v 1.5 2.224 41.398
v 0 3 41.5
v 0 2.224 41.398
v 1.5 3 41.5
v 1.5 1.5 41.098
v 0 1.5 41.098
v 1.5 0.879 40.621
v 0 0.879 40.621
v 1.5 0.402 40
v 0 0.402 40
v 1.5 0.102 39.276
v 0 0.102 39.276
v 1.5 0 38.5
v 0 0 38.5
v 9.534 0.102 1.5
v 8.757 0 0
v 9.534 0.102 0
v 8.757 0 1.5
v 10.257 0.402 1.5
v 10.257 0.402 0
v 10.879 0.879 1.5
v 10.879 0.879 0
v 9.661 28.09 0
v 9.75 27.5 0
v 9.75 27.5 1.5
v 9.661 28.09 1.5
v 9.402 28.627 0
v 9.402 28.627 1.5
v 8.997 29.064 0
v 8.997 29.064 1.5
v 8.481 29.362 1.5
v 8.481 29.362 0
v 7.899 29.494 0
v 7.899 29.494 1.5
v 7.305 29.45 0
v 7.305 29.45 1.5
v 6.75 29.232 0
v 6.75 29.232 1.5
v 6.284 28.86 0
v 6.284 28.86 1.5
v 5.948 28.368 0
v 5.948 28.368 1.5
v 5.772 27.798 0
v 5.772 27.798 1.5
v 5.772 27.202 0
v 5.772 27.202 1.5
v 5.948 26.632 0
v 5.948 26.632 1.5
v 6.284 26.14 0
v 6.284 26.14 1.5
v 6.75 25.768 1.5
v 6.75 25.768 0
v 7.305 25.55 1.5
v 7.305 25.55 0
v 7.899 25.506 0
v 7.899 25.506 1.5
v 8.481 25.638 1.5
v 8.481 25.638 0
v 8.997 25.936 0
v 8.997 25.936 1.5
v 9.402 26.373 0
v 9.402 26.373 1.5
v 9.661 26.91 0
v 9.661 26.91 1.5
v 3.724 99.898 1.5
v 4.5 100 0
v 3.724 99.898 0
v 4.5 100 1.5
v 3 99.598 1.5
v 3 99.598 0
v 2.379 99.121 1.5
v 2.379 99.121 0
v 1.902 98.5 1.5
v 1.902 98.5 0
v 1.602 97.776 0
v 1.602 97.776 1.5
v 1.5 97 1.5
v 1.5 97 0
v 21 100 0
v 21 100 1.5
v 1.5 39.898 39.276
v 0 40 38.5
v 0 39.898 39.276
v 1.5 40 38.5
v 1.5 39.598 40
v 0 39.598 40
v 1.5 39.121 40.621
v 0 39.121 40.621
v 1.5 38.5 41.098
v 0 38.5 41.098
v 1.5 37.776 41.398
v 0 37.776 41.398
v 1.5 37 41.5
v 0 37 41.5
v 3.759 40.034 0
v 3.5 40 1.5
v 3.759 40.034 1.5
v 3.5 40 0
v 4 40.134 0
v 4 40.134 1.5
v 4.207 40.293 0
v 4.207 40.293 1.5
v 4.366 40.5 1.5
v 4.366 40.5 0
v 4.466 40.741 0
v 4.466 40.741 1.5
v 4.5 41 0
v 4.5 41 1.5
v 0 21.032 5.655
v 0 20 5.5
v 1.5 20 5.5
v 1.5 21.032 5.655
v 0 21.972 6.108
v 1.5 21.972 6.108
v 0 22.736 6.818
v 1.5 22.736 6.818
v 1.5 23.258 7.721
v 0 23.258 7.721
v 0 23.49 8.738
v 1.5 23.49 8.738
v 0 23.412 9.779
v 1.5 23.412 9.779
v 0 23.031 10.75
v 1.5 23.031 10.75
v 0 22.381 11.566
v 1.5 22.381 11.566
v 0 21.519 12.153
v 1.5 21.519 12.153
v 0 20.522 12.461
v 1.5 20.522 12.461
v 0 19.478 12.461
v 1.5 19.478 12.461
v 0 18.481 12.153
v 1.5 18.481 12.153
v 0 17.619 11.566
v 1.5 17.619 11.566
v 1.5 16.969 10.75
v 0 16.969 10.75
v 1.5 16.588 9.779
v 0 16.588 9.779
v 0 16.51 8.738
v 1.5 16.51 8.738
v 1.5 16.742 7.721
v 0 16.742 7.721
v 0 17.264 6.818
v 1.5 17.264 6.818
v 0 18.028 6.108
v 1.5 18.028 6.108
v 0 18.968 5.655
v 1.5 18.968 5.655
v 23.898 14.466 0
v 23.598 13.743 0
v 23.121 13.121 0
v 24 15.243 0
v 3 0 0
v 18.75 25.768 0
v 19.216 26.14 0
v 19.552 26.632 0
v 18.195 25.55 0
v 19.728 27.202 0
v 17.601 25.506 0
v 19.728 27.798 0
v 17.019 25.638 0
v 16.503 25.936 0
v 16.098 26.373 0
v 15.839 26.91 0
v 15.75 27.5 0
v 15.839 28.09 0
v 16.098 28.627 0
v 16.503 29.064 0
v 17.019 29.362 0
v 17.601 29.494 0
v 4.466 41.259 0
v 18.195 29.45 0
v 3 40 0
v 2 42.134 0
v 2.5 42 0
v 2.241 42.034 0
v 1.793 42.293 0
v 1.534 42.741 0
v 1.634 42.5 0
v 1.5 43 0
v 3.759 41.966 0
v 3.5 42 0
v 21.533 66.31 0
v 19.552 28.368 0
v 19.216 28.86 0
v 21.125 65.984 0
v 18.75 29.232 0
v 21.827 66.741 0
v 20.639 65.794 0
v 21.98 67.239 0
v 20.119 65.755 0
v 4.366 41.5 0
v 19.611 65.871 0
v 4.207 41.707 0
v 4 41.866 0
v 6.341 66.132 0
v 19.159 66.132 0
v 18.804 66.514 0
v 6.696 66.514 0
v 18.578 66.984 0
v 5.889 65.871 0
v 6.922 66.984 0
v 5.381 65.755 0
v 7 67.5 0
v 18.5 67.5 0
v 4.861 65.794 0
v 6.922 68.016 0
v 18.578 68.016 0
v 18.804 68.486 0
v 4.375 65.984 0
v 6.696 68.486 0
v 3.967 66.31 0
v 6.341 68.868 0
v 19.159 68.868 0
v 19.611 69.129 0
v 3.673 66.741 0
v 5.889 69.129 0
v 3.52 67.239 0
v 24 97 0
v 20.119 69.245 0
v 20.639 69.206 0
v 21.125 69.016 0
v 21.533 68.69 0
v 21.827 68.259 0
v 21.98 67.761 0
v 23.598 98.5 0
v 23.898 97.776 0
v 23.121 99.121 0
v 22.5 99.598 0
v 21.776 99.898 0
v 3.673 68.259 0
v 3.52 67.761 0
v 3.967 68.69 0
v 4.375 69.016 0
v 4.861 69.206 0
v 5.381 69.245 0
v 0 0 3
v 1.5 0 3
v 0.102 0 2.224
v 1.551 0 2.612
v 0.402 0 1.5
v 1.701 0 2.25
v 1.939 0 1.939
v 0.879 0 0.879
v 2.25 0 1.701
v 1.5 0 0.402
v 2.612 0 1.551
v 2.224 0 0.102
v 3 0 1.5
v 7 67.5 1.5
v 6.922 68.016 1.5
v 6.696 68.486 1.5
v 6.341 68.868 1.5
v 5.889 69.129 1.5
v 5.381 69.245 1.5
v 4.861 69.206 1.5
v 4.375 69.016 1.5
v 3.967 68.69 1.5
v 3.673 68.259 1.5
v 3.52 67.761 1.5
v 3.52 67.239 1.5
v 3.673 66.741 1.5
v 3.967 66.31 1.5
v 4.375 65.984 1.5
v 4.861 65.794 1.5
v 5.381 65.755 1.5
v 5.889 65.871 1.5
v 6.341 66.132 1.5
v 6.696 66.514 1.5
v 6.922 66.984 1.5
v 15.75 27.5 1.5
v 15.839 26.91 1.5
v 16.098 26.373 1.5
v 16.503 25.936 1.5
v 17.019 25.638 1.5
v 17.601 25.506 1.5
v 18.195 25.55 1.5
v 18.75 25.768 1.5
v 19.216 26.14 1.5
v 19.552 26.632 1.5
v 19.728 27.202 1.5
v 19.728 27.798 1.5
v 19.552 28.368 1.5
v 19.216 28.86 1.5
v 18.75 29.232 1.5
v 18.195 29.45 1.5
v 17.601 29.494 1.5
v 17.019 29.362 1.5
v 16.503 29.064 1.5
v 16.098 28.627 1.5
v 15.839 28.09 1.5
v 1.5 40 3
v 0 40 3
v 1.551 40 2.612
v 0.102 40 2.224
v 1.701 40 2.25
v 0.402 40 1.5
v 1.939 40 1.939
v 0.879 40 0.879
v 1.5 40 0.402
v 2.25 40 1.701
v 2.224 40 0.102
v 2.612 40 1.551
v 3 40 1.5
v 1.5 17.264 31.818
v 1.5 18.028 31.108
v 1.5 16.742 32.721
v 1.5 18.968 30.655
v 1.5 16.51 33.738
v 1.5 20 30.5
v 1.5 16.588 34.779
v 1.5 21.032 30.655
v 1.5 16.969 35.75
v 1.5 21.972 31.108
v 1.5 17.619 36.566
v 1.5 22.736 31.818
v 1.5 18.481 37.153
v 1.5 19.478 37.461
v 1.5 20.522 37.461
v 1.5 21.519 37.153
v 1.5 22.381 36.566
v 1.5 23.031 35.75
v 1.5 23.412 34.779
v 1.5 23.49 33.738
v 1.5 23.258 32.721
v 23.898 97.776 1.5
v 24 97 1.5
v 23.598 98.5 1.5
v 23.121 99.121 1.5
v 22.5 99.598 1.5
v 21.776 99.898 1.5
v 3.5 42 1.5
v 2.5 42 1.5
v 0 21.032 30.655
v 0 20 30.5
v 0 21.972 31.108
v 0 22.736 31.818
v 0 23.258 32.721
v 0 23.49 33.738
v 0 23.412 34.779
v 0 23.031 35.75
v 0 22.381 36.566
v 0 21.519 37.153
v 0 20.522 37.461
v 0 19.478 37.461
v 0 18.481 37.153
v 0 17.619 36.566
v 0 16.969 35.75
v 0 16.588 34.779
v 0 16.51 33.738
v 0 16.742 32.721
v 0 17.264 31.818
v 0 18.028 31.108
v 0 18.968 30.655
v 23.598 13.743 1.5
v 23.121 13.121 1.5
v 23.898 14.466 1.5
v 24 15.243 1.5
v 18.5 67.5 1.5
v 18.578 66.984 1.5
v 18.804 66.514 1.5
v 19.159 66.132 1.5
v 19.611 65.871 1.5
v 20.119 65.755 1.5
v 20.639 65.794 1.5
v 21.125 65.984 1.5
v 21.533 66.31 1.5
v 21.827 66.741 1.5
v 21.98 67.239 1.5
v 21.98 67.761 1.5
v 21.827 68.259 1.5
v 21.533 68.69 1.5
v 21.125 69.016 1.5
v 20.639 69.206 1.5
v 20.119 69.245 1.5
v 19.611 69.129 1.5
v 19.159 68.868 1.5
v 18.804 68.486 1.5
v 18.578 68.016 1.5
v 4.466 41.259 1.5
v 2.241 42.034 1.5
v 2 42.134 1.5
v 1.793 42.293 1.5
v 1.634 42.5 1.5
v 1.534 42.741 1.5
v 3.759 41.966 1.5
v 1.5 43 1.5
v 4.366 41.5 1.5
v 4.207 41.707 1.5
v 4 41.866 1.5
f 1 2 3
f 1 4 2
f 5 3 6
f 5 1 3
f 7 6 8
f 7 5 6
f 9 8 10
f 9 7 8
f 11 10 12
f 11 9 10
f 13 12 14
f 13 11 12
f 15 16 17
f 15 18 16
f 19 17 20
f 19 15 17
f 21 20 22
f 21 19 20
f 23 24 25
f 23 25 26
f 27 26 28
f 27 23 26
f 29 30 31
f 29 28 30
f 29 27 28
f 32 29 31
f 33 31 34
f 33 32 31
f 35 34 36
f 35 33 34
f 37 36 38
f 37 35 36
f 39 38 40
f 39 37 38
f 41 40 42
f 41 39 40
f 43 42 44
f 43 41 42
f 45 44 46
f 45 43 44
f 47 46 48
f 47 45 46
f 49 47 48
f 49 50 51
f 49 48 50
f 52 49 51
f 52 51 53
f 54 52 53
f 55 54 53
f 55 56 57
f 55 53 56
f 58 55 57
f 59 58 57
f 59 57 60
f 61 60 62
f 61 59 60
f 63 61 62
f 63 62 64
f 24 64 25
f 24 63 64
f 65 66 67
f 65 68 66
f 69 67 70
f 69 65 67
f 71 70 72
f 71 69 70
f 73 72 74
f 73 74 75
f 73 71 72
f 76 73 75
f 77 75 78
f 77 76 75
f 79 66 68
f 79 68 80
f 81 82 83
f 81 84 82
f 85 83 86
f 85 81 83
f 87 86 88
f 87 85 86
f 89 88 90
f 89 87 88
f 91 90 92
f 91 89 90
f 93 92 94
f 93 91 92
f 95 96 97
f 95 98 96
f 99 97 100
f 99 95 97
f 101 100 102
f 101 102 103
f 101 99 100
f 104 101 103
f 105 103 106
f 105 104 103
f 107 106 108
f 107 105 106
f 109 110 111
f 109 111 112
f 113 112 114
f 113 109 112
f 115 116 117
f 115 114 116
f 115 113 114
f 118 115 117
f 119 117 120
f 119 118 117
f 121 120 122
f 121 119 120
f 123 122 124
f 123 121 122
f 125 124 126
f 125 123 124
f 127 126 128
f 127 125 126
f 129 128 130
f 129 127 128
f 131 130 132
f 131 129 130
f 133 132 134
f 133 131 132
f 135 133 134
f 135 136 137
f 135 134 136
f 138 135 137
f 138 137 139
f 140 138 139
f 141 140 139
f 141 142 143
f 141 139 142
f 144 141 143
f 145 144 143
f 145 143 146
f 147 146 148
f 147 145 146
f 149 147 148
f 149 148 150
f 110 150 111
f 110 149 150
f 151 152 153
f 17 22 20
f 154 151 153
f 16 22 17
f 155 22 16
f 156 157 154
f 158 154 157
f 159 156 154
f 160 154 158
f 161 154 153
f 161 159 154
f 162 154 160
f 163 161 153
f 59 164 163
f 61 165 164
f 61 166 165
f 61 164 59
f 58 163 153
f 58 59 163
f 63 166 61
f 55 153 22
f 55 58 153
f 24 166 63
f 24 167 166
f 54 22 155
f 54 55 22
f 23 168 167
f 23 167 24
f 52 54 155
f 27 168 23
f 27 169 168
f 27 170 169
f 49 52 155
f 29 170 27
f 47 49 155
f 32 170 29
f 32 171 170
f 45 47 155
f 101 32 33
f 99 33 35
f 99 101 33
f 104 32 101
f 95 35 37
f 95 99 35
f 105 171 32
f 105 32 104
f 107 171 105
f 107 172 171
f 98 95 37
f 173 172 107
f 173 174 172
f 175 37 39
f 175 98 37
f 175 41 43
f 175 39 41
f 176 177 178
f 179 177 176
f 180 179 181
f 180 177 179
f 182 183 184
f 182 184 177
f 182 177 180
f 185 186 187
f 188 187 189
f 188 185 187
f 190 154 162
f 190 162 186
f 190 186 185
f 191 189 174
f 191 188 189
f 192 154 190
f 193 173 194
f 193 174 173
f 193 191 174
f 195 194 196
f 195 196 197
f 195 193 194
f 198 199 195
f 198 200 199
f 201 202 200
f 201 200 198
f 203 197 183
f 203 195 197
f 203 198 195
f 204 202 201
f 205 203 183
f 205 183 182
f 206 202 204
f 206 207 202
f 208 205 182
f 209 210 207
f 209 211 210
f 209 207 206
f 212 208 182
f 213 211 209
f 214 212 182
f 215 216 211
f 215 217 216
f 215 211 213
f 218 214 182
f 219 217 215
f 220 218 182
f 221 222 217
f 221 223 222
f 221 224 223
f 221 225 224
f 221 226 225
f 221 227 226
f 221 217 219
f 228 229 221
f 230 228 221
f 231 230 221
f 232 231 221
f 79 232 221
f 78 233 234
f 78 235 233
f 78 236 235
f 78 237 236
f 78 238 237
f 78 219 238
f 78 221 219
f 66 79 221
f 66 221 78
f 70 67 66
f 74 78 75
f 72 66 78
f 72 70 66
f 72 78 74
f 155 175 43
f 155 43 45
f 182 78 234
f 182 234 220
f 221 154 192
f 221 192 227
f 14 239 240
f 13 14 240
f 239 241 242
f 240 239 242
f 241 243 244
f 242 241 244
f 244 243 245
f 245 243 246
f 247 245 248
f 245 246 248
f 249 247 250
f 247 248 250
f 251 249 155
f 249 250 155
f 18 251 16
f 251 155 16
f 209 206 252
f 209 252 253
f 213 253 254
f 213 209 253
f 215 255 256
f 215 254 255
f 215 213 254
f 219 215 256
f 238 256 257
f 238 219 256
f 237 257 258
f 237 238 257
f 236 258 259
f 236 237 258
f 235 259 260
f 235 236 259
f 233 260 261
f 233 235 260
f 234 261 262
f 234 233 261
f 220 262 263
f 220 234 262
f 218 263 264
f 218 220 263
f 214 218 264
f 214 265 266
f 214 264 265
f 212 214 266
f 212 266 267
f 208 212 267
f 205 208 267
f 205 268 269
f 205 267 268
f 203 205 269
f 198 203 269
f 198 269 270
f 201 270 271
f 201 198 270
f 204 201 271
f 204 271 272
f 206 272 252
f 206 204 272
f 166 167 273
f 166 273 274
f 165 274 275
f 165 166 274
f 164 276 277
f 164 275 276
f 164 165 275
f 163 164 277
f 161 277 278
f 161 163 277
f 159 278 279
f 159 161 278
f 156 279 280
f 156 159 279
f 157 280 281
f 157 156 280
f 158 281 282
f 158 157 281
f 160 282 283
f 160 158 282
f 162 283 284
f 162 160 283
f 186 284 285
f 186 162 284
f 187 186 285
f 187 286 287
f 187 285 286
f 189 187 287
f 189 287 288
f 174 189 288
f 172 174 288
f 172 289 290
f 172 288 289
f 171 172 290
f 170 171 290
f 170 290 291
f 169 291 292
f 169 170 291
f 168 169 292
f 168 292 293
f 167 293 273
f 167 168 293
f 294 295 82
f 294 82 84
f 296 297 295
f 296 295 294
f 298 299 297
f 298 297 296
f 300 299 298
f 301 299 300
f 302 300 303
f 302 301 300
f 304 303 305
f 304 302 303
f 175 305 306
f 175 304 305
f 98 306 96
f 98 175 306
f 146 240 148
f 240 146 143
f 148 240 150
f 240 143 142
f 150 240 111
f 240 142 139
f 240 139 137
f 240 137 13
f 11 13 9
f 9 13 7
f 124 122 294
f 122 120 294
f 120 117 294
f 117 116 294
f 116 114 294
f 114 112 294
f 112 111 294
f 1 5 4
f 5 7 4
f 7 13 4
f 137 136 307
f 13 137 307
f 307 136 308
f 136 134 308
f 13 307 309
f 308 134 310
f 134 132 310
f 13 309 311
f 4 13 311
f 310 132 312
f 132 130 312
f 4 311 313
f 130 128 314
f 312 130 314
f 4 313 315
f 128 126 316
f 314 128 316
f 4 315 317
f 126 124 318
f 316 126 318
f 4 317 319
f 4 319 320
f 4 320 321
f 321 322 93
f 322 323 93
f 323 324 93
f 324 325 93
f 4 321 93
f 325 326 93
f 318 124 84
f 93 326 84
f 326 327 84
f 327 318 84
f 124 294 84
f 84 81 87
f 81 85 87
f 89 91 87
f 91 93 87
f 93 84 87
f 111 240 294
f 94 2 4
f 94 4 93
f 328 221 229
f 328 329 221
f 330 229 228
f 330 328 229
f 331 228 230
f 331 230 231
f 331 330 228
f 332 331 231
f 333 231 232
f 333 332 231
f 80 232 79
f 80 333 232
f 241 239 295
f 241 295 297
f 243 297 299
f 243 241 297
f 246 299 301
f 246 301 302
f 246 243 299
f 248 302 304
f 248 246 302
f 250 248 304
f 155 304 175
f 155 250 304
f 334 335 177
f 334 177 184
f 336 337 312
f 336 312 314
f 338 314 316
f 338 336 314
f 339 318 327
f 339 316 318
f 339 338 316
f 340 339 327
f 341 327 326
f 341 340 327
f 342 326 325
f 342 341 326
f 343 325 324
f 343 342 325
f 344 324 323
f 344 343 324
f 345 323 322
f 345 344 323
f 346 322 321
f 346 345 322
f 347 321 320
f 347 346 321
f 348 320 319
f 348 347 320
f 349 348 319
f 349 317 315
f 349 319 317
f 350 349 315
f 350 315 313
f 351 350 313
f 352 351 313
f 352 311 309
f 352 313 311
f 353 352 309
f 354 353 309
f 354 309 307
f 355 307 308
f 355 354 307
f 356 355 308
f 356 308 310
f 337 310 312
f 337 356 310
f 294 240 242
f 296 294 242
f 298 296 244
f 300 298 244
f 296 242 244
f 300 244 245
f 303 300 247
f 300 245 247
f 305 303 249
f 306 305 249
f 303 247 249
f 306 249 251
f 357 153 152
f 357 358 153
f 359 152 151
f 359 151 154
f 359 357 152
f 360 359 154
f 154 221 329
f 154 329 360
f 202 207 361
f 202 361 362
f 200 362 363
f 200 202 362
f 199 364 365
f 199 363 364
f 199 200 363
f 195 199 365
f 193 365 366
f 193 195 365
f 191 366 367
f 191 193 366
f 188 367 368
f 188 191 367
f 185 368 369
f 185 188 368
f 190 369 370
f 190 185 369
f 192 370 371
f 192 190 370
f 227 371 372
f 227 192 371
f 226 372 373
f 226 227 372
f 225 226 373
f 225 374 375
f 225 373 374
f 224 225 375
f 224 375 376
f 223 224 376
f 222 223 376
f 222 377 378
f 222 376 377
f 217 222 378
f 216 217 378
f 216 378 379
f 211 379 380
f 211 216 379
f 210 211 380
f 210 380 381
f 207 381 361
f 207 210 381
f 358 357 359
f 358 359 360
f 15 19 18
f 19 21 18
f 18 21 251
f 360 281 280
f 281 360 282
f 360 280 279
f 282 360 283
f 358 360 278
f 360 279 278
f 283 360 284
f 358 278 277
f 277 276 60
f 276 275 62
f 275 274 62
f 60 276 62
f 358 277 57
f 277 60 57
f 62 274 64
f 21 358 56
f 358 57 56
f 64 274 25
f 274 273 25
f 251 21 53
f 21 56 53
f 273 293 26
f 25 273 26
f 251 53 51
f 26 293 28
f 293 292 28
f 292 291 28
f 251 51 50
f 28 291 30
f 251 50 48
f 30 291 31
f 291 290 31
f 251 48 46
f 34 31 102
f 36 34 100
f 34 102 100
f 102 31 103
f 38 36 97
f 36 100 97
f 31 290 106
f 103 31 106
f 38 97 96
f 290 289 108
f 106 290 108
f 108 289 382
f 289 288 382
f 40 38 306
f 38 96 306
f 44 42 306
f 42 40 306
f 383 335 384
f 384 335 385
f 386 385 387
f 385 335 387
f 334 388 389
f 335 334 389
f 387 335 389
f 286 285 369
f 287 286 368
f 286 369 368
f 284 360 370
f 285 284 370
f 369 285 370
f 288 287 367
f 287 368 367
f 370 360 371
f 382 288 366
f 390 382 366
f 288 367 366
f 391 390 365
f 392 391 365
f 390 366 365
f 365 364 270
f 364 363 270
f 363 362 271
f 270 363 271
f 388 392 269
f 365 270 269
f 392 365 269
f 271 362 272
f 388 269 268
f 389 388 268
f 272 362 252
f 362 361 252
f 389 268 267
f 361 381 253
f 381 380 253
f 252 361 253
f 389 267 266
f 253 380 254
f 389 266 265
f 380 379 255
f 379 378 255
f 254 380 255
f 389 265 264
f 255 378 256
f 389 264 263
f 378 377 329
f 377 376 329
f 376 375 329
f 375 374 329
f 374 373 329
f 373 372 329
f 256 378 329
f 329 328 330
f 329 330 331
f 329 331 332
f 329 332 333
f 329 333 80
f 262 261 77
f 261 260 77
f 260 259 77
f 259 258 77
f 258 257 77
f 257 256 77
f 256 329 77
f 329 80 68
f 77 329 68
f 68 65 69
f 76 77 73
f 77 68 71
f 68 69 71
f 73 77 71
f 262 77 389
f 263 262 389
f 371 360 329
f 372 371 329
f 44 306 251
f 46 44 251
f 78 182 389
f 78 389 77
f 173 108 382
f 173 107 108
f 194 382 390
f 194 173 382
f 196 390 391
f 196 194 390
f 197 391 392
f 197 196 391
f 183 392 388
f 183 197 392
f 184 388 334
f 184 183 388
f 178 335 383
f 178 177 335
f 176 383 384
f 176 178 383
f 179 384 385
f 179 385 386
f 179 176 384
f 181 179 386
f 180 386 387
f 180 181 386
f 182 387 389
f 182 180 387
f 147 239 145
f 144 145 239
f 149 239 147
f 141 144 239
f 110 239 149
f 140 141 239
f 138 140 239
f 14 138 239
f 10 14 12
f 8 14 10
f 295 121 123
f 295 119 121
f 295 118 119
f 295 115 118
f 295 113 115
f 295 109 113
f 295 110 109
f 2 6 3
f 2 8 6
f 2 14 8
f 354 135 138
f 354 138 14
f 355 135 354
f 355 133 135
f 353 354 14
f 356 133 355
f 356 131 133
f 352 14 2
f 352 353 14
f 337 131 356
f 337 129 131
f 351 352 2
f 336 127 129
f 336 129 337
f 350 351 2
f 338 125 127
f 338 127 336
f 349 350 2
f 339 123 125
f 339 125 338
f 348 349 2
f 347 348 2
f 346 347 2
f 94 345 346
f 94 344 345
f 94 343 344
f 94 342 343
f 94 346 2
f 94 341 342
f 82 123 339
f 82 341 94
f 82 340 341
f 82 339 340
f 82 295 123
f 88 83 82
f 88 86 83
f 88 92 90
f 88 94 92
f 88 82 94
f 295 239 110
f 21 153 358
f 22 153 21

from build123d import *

# Parameters (mm, degrees)
BOSS_EXTRU_1_DEPTH           = 1.5
ESQUISSE2_W                  = 40
ESQUISSE2_H                  = 40
BOSS_EXTRU_2_DEPTH           = 1.5
ENL_V_MAT_EXTRU_1_DEPTH      = 111.344913793
ENL_V_MAT_EXTRU_1_DEPTH_BACK = 111.344913793
ESQUISSE3_W                  = 1.5
ESQUISSE3_H                  = 60
ENL_V_MAT_EXTRU_2_DEPTH      = 111.344913793
ENL_V_MAT_EXTRU_2_DEPTH_BACK = 111.344913793
ESQUISSE4_R                  = 1.75
ESQUISSE4_R_2                = 2
ENL_V_MAT_EXTRU_3_DEPTH      = 111.582548352
ENL_V_MAT_EXTRU_3_DEPTH_BACK = 111.582548352
ESQUISSE5_R                  = 3.5
ESQUISSE14_W                 = 3
ESQUISSE14_H                 = 2
ENL_V_MAT_EXTRU_4_DEPTH      = 111.344913793
CONG_4_R                     = 1
CONG_5_R                     = 3
CONVERTIR_VOLUME2_DEPTH      = 40
CONVERTIR_VOLUME2_2_DEPTH    = 40


# Read off the part's stored shape, not the designer's step: Convertir-Volume2
with BuildPart() as part:
    # Esquisse1 → Boss.-Extru.1 (new body)
    with BuildSketch(Plane.XY):
        Polygon((0, 0), (0, 100), (24, 100), (24, 14), (10, 0), align=None)
    extrude(amount=BOSS_EXTRU_1_DEPTH)

    # Esquisse2 → Boss.-Extru.2 (add)
    with BuildSketch(Plane.ZY):
        with Locations((21.5, 20)):
            Rectangle(ESQUISSE2_W, ESQUISSE2_H)
    extrude(amount=-BOSS_EXTRU_2_DEPTH)

    # Esquisse3 → Enlèv. mat.-Extru.1 (cut, two sides: drawn at the far end of the back side and taken through both)
    with BuildSketch(Plane.XY.offset(1.5).offset(-ENL_V_MAT_EXTRU_1_DEPTH_BACK)):
        with Locations((0.75, 70)):
            Rectangle(ESQUISSE3_W, ESQUISSE3_H)
    extrude(amount=ENL_V_MAT_EXTRU_1_DEPTH + ENL_V_MAT_EXTRU_1_DEPTH_BACK, mode=Mode.SUBTRACT)

    # Esquisse4 → Enlèv. mat.-Extru.2 (cut, two sides: drawn at the far end of the back side and taken through both)
    with BuildSketch(Plane.XY.offset(1.5).offset(-ENL_V_MAT_EXTRU_2_DEPTH_BACK)):
        with Locations((5.25, 67.5)):
            Circle(ESQUISSE4_R)
        with Locations(Location((20.25, 67.5, 0), (0, 0, 180))):
            Circle(ESQUISSE4_R)
        with Locations((7.75, 27.5)):
            Circle(ESQUISSE4_R_2)
        with Locations(Location((17.75, 27.5, 0), (0, 0, 180))):
            Circle(ESQUISSE4_R_2)
    extrude(amount=ENL_V_MAT_EXTRU_2_DEPTH + ENL_V_MAT_EXTRU_2_DEPTH_BACK, mode=Mode.SUBTRACT)

    # Esquisse5 → Enlèv. mat.-Extru.3 (cut, two sides: drawn at the far end of the back side and taken through both)
    with BuildSketch(Plane(origin=(1.5, 0, 0), x_dir=(0, 0, -1), z_dir=(1, 0, 0)).offset(-ENL_V_MAT_EXTRU_3_DEPTH_BACK)):
        with Locations((-34, 20)):
            Circle(ESQUISSE5_R)
        with Locations((-9, 20)):
            Circle(ESQUISSE5_R)
    extrude(amount=ENL_V_MAT_EXTRU_3_DEPTH + ENL_V_MAT_EXTRU_3_DEPTH_BACK, mode=Mode.SUBTRACT)

    # Esquisse14 → Enlèv. mat.-Extru.4 (cut, through all)
    with BuildSketch(Plane.XY.offset(1.5)):
        with Locations((3, 41)):
            Rectangle(ESQUISSE14_W, ESQUISSE14_H)
    extrude(amount=-ENL_V_MAT_EXTRU_4_DEPTH, mode=Mode.SUBTRACT)

    # Congé4
    cong_4_edges = [part.edges().sort_by_distance(p)[0] for p in [
        (1.5, 42, 0.75),
        (4.5, 42, 0.75),
        (4.5, 40, 0.75),
    ]]
    fillet(cong_4_edges, radius=CONG_4_R - 0.0001)  # a hair under: the kernel refuses the full size

    # Congé5
    cong_5_edges = [part.edges().sort_by_distance(p)[0] for p in [
        (0.75, 40, 41.5),
        (0.75, 0, 41.5),
        (1.5, 100, 0.75),
        (24, 100, 0.75),
        (24, 14, 0.75),
        (10, 0, 0.75),
    ]]
    fillet(cong_5_edges, radius=CONG_5_R)

    # Convertir-Volume2 outline → Convertir-Volume2 (cut)
    with BuildSketch(Plane(origin=(0, 0, 0), x_dir=(1, 0, 0), z_dir=(0, 1, 0))):
        with BuildLine():
            Line((0, 0), (0, -3))
            ThreePointArc((0, -3), (0.878679656, -0.878679656), (3, 0))
            Line((3, 0), (0, 0))
        make_face()
    extrude(amount=CONVERTIR_VOLUME2_DEPTH, mode=Mode.SUBTRACT)

    # Convertir-Volume2 2 outline → Convertir-Volume2 2 (add)
    with BuildSketch(Plane(origin=(0, 0, 0), x_dir=(1, 0, 0), z_dir=(0, 1, 0))):
        with BuildLine():
            Line((1.5, -1.5), (1.5, -3))
            ThreePointArc((1.5, -3), (1.939339828, -1.939339828), (3, -1.5))
            Line((3, -1.5), (1.5, -1.5))
        make_face()
    extrude(amount=CONVERTIR_VOLUME2_2_DEPTH)


solid = part.part
